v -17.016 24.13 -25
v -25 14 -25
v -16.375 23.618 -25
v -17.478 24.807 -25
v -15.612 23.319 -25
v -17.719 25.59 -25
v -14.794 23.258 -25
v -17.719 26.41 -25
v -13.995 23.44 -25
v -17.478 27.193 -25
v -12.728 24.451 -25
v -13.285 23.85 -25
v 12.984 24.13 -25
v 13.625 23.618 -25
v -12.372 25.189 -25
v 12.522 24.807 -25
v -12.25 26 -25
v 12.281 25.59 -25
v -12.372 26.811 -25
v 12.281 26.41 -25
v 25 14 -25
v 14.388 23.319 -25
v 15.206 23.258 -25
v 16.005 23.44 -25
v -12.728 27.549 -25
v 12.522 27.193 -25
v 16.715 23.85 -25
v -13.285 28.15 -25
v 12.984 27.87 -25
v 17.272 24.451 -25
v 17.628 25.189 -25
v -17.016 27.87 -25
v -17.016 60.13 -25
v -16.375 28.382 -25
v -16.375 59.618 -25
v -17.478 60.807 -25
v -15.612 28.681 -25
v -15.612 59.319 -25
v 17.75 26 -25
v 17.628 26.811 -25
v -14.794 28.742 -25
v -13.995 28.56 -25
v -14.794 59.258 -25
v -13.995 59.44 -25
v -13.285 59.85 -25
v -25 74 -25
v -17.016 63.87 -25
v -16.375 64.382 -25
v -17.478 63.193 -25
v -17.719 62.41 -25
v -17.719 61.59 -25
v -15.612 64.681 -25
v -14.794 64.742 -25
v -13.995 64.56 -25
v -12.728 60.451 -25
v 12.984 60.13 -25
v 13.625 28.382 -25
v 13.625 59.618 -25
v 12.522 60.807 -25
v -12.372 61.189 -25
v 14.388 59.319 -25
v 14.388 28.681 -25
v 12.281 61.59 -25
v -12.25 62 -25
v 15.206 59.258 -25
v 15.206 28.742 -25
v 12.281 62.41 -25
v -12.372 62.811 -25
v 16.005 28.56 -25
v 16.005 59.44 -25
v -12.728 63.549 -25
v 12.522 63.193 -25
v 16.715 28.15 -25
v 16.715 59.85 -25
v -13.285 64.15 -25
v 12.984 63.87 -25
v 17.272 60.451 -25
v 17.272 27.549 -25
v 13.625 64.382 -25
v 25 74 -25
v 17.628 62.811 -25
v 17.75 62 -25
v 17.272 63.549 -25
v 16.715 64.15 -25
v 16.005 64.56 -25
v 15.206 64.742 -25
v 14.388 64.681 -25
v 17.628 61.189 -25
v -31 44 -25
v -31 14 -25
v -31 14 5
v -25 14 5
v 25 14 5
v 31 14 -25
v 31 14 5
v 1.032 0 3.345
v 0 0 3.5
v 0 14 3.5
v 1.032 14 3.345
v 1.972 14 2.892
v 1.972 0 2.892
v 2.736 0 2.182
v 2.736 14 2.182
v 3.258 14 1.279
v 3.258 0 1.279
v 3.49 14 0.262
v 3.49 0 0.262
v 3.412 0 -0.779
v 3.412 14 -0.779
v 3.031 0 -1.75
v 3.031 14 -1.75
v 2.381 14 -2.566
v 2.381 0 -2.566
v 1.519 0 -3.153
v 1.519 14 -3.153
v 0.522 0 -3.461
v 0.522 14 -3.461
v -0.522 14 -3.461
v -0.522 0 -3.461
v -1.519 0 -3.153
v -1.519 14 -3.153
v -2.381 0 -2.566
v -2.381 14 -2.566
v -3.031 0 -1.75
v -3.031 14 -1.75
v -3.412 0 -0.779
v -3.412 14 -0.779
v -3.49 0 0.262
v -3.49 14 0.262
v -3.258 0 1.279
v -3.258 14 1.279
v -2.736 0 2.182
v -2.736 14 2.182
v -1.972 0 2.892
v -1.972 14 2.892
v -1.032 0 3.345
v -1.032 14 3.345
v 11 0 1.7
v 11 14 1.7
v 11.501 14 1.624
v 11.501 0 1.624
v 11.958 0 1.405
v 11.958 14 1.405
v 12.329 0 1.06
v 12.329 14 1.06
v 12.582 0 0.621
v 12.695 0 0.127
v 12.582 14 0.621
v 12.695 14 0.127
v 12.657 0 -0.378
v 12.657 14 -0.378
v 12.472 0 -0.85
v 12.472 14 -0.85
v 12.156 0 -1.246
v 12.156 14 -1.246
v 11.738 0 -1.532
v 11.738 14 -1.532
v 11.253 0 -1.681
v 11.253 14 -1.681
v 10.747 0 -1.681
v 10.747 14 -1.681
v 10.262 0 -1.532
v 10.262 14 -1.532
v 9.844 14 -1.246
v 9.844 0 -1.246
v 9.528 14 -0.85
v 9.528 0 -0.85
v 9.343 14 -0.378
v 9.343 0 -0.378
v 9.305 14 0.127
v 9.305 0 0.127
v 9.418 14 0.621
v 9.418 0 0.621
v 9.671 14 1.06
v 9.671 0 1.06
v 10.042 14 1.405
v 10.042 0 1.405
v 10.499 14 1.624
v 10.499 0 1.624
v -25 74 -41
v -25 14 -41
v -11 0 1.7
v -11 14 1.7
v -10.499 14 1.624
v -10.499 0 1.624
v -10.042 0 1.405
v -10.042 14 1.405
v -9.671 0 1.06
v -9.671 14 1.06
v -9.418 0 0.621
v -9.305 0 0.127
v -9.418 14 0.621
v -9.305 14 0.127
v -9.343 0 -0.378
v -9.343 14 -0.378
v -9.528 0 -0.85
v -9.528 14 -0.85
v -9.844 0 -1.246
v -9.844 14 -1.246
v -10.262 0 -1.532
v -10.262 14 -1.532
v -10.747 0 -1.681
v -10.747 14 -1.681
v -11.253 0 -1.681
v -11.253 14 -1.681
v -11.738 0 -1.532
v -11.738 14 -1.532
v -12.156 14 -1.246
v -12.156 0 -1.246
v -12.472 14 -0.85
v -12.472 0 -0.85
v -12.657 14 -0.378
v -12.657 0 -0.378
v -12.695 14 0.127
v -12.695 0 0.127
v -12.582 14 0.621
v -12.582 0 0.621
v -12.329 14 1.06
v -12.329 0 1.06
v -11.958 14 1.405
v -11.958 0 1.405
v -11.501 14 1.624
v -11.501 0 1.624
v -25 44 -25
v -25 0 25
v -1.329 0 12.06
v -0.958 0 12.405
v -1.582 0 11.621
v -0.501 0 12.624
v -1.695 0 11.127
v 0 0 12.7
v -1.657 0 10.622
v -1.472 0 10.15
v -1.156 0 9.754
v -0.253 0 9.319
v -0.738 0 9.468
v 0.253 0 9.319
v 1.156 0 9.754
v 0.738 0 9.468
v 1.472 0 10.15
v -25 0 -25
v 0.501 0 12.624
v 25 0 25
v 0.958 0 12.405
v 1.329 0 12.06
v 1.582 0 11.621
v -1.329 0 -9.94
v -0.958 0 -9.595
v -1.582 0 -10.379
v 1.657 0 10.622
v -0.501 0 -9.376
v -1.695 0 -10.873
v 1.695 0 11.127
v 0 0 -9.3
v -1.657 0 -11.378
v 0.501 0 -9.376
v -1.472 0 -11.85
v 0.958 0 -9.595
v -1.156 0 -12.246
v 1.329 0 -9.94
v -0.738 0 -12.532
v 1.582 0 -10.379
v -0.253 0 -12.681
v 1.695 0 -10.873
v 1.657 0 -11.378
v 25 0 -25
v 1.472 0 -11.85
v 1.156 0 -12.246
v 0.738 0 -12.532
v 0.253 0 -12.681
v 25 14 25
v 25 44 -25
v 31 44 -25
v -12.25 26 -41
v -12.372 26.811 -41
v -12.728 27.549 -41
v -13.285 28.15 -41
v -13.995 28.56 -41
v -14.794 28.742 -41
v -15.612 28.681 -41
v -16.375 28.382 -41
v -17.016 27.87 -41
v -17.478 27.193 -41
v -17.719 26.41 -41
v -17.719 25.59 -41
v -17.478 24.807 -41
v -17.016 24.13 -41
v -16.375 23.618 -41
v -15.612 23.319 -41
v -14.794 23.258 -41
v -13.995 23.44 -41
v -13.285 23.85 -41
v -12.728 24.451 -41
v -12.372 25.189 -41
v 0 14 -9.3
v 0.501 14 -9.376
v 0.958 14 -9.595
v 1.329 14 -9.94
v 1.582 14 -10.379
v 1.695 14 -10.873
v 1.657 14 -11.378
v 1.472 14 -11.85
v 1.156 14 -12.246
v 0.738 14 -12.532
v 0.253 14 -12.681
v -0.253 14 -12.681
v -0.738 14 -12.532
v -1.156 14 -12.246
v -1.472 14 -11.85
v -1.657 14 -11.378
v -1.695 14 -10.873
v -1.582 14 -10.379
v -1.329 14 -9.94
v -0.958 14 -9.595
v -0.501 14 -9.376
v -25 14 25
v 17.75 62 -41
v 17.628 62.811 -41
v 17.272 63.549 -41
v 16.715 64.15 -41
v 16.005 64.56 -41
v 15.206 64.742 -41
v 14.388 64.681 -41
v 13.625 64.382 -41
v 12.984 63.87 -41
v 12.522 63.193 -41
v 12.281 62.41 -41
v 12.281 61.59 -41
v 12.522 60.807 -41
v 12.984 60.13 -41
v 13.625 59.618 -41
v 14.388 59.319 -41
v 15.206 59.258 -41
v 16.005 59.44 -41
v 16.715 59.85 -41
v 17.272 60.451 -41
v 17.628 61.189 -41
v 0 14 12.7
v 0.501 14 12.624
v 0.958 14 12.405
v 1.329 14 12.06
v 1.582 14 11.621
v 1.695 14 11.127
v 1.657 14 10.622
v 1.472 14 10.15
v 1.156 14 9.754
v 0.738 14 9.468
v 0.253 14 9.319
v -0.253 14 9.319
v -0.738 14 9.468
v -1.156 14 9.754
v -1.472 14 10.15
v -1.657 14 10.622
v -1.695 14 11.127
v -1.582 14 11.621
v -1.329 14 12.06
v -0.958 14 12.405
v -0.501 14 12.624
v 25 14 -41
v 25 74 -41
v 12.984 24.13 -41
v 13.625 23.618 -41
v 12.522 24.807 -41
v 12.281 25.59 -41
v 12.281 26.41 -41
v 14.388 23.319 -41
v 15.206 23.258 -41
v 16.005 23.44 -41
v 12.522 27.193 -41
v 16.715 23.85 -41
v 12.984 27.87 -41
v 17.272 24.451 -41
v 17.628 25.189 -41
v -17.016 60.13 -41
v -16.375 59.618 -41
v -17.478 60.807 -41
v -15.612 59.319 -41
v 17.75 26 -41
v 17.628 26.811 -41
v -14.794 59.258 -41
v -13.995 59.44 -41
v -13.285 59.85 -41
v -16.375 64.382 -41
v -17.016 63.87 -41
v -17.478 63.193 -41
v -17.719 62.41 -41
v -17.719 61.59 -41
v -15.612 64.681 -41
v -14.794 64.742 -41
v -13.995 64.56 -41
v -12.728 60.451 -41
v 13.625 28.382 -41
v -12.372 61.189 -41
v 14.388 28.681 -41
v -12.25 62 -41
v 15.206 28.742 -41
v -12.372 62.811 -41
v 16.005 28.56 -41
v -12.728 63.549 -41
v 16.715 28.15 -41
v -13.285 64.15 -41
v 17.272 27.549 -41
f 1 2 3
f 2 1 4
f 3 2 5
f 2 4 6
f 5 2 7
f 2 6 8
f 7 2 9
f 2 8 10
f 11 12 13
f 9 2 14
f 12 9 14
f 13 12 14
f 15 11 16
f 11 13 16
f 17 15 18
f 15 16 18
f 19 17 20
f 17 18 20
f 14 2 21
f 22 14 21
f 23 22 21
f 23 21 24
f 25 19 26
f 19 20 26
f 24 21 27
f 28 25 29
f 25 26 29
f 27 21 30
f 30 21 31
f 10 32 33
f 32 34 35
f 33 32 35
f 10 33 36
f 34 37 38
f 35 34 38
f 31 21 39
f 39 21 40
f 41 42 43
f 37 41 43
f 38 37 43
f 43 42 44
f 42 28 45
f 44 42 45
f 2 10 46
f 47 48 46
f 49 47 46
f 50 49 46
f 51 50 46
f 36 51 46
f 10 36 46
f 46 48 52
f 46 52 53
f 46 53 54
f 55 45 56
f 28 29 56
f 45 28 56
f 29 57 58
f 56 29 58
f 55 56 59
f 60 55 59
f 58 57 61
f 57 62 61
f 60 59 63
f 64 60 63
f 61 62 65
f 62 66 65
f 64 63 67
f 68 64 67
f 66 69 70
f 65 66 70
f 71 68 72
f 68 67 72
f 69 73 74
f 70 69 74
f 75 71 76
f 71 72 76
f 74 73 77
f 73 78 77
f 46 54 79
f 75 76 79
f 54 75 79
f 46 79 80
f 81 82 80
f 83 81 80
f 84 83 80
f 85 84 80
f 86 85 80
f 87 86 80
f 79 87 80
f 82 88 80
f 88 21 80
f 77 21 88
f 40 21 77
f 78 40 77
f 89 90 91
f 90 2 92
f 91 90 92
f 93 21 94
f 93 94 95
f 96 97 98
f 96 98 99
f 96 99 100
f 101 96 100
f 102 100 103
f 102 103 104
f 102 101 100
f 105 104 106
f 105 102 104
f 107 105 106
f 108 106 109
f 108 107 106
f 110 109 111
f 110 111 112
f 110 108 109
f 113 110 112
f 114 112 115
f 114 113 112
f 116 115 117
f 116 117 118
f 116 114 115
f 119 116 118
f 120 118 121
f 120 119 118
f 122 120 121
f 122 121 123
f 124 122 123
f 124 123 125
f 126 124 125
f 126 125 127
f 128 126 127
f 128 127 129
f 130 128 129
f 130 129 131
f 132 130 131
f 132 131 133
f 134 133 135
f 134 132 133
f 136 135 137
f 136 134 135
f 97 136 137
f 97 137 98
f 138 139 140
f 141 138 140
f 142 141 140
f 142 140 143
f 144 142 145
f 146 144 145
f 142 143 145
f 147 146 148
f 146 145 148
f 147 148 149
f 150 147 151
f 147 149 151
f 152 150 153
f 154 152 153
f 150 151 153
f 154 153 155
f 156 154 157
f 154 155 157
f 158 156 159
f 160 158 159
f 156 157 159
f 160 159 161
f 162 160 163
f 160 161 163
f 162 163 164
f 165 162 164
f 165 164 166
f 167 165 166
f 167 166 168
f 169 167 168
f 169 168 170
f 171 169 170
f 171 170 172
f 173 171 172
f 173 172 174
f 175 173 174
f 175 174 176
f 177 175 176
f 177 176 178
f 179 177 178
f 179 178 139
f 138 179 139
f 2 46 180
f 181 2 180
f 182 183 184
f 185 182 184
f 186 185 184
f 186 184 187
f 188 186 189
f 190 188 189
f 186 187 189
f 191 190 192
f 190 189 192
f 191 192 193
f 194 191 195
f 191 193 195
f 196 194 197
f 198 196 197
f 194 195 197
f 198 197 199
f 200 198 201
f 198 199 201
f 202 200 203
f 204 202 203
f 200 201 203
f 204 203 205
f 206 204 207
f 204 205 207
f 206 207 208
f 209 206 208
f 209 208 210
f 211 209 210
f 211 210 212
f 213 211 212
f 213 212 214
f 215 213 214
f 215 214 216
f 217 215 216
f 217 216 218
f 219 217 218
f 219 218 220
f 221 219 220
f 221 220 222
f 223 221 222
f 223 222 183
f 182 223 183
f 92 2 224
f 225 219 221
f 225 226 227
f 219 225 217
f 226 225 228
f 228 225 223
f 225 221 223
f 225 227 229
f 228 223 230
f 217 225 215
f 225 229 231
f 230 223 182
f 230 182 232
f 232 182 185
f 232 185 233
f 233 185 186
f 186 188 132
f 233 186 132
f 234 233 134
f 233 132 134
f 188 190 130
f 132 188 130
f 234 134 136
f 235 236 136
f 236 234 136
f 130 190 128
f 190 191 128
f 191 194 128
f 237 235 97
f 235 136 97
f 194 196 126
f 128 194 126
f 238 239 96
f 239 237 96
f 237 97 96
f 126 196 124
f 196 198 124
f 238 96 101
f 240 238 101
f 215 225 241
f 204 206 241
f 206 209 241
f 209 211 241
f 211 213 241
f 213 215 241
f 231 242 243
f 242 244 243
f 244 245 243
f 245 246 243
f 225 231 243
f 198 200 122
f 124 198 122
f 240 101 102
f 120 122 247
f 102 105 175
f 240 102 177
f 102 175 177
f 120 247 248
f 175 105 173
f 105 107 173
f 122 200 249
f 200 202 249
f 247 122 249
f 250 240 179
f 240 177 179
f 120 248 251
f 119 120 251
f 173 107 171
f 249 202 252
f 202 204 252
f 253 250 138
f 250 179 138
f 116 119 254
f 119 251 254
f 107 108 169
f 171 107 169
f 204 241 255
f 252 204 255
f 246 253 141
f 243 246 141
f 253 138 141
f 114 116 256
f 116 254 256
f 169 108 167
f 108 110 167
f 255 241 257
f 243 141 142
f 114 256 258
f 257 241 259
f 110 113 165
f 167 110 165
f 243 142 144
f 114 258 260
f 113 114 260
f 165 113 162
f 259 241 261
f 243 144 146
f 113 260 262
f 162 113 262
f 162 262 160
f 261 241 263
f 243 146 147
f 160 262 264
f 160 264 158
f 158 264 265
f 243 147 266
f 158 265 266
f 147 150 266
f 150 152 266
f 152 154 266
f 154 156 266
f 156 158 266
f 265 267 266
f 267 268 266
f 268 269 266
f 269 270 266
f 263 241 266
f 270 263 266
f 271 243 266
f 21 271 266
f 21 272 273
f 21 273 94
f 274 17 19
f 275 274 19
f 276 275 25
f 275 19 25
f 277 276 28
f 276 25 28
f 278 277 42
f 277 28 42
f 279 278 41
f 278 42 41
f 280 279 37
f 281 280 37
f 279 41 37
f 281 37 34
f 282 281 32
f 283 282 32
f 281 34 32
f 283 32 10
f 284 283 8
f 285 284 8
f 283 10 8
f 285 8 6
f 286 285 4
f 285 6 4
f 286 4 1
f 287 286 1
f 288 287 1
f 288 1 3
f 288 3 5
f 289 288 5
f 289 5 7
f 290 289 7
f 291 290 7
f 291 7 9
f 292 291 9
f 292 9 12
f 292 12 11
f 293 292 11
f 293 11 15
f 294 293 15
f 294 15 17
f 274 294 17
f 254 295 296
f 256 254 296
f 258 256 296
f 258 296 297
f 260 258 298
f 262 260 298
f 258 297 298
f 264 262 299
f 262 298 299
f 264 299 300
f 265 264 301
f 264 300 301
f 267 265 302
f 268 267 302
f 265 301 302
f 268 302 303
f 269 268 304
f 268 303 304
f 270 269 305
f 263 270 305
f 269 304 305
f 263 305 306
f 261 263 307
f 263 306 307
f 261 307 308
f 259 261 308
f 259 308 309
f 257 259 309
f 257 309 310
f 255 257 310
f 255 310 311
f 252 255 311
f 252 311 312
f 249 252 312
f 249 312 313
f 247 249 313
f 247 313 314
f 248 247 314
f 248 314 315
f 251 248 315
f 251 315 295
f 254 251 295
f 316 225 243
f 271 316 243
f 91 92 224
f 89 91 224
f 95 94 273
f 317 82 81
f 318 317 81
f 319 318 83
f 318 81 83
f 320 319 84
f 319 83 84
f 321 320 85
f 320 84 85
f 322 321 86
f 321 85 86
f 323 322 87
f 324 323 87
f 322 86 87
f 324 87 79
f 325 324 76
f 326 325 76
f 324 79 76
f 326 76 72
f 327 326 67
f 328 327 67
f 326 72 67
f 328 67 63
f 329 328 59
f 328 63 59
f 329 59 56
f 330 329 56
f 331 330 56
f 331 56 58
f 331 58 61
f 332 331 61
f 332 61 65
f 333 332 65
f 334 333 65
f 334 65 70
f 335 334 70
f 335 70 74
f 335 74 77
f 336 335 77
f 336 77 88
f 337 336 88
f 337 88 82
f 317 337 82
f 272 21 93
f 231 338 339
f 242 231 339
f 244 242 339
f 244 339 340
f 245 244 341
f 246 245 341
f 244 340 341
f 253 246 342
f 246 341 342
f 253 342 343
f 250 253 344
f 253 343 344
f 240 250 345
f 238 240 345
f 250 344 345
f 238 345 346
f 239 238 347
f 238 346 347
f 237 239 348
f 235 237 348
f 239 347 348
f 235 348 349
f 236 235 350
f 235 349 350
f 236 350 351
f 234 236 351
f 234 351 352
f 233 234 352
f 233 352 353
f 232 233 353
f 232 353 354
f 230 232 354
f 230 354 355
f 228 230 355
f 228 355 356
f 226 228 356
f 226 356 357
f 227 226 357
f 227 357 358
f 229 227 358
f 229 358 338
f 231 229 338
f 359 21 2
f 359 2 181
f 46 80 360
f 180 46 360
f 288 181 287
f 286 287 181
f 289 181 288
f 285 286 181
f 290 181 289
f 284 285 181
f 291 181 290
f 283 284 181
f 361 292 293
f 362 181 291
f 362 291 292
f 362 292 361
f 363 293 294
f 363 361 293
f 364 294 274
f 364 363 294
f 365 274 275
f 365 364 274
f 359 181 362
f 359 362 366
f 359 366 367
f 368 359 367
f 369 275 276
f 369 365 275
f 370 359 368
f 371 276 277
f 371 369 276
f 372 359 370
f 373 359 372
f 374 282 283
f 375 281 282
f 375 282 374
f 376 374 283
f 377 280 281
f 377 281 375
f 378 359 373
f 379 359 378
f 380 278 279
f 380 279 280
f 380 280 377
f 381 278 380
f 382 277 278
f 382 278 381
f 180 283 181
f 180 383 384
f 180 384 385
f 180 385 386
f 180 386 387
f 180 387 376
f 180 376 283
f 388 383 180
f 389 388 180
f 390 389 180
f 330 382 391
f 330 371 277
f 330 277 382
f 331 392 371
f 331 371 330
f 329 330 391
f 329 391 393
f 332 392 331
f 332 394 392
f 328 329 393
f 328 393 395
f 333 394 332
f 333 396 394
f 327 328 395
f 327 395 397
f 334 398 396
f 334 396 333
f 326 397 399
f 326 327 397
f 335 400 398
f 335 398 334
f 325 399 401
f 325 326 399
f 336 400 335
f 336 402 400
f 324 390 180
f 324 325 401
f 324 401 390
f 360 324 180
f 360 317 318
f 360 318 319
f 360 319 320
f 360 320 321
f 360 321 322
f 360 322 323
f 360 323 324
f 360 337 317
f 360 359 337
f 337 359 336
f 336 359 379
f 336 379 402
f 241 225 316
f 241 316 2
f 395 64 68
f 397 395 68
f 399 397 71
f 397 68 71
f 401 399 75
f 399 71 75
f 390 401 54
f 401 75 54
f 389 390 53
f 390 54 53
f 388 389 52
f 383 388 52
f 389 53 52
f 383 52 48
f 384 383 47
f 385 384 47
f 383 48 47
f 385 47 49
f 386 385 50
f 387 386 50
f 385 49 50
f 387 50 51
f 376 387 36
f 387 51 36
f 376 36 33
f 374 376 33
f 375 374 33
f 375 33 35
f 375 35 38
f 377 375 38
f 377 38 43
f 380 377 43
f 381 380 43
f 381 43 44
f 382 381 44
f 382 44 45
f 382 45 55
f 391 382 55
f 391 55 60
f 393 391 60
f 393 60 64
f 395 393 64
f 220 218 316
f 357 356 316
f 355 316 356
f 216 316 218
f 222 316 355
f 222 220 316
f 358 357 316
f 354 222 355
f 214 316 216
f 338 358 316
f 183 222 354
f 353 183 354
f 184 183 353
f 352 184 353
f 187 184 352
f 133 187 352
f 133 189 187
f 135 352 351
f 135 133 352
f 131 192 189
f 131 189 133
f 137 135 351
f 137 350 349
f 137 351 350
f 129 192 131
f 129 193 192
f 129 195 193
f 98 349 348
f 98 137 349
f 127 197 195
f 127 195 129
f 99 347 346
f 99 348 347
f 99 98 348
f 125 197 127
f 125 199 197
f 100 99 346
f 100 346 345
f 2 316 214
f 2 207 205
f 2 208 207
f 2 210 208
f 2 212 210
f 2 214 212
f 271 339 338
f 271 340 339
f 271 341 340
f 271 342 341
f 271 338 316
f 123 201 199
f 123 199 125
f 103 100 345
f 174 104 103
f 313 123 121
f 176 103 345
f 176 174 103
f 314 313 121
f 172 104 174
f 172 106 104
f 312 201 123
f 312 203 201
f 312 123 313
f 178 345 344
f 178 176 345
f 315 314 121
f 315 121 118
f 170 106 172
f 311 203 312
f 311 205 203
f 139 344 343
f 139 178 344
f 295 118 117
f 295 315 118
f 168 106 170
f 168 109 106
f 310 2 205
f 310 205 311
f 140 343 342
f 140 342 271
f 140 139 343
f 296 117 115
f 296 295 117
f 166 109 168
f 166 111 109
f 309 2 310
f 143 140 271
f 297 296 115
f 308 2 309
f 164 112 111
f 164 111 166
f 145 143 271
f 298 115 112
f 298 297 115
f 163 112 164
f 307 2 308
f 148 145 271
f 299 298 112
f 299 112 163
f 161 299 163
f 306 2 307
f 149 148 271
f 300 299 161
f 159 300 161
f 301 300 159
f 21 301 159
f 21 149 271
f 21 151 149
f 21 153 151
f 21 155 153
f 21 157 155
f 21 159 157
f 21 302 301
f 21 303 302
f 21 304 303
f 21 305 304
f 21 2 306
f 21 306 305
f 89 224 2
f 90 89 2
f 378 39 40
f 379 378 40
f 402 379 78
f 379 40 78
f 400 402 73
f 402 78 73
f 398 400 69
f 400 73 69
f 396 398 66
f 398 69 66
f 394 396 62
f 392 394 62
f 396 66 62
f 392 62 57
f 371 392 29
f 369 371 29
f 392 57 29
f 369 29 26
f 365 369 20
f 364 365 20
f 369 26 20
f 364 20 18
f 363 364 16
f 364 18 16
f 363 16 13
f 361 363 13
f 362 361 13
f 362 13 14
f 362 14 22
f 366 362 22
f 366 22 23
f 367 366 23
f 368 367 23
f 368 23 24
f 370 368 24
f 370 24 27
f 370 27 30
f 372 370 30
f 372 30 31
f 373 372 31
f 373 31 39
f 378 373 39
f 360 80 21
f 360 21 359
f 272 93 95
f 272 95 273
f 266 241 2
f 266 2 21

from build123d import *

# Parameters (mm, degrees)
SKETCH1_W         = 50
SKETCH1_H         = 50
SKETCH1_R         = 3.5
MOTOR_BASE_DEPTH  = 14
SKETCH2_W         = 16
SKETCH2_H         = 60
WALL_MOUNT_DEPTH  = 50
SKETCH6_R         = 1.7
MOTOR_HOLES_DEPTH = 77.850504227
SKETCH8_R         = 2.75
WALL_HOLES_DEPTH  = 93.741576437
GUSSET1_DEPTH     = 6


with BuildPart() as part:
    # Sketch1 → Motor Base (new body)
    with BuildSketch(Plane(origin=(0, 0, 0), x_dir=(1, 0, 0), z_dir=(0, 1, 0))):
        Rectangle(SKETCH1_W, SKETCH1_H)
        with Locations(Location((0, 0, 0), (0, 0, 270))):
            Circle(SKETCH1_R, mode=Mode.SUBTRACT)
    extrude(amount=MOTOR_BASE_DEPTH)

    # Sketch6 → Motor Holes (cut, through all)
    with BuildSketch(Plane(origin=(0, 14, 0), x_dir=(1, 0, 0), z_dir=(0, 1, 0))):
        with Locations(Location((0, 11, 0), (0, 0, 270))):
            Circle(SKETCH6_R)
        with Locations(Location((11, 0, 0), (0, 0, 270))):
            Circle(SKETCH6_R)
        with Locations(Location((0, -11, 0), (0, 0, 270))):
            Circle(SKETCH6_R)
        with Locations(Location((-11, 0, 0), (0, 0, 270))):
            Circle(SKETCH6_R)
    extrude(amount=-MOTOR_HOLES_DEPTH, mode=Mode.SUBTRACT)


with BuildPart() as body_2:
    # Sketch2 → Wall Mount (new, through all)
    with BuildSketch(Plane(origin=(25, 0, 0), x_dir=(0, 0, -1), z_dir=(1, 0, 0))):
        with Locations((33, 44)):
            Rectangle(SKETCH2_W, SKETCH2_H)
    extrude(amount=-WALL_MOUNT_DEPTH)

    # Sketch8 → Wall Holes (cut, through all)
    with BuildSketch(Plane.XY.offset(-25)):
        with Locations((-15, 62)):
            Circle(SKETCH8_R)
        with Locations((15, 62)):
            Circle(SKETCH8_R)
        with Locations((15, 26)):
            Circle(SKETCH8_R)
        with Locations((-15, 26)):
            Circle(SKETCH8_R)
    extrude(amount=-WALL_HOLES_DEPTH, mode=Mode.SUBTRACT)


with BuildPart() as body_3:
    # Sketch10 → gusset1 (new body)
    with BuildSketch(Plane.ZY.offset(25)):
        Polygon((-25, 14), (5, 14), (-25, 44), align=None)
    extrude(amount=GUSSET1_DEPTH)


with BuildPart() as body_4:
    # Mirror2: mirrored copy
    add(body_3.part.mirror(Plane(origin=(0, 0, 0), x_dir=(0, 0, 1), z_dir=(1, 0, 0))))


solid = Compound([part.part, body_2.part, body_3.part, body_4.part])
